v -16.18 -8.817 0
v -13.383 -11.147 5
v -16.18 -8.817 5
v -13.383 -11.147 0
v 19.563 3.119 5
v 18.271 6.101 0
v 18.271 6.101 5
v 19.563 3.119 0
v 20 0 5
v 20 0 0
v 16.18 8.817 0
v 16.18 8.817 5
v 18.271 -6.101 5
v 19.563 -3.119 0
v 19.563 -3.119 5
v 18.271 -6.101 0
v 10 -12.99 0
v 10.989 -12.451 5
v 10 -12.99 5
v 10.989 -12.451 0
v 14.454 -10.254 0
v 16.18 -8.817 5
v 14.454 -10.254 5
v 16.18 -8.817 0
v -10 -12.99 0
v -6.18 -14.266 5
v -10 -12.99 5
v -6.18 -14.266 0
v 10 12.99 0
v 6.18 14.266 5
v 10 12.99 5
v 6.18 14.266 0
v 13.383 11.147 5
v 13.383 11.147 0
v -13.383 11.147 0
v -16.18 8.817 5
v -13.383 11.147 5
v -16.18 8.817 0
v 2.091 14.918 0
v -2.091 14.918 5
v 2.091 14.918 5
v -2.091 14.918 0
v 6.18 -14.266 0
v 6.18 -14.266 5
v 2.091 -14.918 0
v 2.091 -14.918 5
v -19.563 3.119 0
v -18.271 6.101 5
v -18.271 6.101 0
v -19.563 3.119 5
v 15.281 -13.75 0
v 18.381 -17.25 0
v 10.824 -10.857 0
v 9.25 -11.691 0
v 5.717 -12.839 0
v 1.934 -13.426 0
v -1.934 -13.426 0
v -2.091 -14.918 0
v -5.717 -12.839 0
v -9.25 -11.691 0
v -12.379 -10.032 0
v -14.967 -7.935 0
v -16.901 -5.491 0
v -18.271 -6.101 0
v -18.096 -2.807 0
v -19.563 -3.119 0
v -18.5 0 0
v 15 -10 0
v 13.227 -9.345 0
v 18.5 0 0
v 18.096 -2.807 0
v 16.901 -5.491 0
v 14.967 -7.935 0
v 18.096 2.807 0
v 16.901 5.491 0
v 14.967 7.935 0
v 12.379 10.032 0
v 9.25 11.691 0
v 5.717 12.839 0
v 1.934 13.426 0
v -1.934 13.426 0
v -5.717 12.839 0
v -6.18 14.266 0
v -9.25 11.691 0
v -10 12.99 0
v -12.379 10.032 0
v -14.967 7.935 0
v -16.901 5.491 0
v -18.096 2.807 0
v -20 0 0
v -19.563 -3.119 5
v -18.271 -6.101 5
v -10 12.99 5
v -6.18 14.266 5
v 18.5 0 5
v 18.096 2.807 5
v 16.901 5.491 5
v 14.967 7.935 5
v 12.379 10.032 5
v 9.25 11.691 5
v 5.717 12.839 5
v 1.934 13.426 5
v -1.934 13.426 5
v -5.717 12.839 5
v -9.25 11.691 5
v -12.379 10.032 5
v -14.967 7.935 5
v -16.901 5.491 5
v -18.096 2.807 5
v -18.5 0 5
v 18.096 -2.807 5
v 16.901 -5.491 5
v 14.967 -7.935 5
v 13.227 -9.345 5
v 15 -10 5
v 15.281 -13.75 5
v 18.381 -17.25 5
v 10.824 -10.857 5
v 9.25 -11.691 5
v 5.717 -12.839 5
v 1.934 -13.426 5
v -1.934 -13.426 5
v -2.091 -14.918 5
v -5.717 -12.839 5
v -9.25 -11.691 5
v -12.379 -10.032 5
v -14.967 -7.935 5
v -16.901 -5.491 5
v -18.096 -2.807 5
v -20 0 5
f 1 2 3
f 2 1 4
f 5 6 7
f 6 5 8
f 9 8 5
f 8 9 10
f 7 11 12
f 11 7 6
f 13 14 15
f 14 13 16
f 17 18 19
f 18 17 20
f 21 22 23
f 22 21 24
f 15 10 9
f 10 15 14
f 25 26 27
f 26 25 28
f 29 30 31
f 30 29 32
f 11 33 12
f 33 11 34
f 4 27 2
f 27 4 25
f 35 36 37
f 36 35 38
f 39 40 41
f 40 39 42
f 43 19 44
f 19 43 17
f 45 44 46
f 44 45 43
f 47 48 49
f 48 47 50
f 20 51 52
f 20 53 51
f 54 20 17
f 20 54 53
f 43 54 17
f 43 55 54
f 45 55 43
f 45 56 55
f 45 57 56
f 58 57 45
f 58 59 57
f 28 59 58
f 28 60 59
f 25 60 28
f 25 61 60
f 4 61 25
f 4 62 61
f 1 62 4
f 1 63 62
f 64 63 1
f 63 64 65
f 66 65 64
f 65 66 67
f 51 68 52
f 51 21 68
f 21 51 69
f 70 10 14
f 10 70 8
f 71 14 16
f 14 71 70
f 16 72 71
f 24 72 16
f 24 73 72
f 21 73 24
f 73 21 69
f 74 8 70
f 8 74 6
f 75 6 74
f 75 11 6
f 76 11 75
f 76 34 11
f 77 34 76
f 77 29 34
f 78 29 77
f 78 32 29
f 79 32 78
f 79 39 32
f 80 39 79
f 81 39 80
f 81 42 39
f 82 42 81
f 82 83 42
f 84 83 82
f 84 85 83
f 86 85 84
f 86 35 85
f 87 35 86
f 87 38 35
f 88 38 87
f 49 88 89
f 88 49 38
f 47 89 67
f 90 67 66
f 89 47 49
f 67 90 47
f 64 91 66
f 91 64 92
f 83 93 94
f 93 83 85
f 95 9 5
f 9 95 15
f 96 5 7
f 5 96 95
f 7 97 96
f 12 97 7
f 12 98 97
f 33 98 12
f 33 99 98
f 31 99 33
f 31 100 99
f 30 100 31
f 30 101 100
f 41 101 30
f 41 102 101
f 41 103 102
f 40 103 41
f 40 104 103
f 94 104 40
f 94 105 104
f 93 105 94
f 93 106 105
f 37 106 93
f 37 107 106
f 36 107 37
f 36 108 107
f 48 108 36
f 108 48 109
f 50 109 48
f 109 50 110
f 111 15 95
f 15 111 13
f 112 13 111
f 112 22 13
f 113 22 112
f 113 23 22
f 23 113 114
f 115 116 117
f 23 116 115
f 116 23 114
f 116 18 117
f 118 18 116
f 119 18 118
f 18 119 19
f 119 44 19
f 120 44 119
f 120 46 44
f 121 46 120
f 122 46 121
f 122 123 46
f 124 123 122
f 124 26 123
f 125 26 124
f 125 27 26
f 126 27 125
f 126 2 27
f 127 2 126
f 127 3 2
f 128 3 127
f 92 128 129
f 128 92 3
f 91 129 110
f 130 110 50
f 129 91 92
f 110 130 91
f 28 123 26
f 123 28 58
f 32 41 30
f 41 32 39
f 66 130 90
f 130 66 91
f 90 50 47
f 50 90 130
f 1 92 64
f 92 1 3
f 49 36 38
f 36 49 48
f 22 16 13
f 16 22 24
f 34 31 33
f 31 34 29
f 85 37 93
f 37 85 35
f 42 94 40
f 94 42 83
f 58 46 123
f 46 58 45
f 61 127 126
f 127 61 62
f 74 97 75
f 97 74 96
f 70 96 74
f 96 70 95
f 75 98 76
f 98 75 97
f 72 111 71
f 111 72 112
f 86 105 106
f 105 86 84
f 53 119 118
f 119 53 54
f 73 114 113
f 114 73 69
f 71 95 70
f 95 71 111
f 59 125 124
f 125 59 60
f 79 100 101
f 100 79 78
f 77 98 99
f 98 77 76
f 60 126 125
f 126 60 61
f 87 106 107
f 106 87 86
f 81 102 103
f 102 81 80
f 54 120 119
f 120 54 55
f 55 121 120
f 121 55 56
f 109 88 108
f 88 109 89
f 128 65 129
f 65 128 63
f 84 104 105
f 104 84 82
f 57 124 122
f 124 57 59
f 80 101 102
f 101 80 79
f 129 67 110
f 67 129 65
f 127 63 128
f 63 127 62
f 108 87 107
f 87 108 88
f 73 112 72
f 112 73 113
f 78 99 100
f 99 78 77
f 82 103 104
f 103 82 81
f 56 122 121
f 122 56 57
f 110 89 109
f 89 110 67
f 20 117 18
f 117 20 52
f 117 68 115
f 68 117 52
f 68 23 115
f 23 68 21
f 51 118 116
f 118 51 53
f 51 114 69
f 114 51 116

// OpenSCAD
// file: ../../open-oval/open-oval.scad
use <MCAD/shapes.scad>
//use </usr/share/openscad/libraries/MCAD/shapes.scad>
//use </Applications/OpenSCAD.app/Contents/Resources/libraries/MCAD/shapes.scad>

module openOval(borderThickness = 3, yLength = 10)
{
	openOval2d(borderThickness = borderThickness,
			   height = yLength);
}

/** Support functions and modules follow.  **/

module openOval2d(borderThickness = 3,
				  depth = 5,
				  height = 10,
				  width = 20)
{
	difference()
	{
		ellipticalCylinder(w = width, h = height, height = depth);

		w = width - borderThickness;
		h = height - borderThickness;
		translate([0, 0, -0.02])
		ellipticalCylinder(w = w, h = h, height = depth + 0.1);
	}
}
// file: ../dialog-bubble.scad
use <MCAD/triangles.scad>
//use <MCAD/shapes.scad>

use <../open-oval/open-oval.scad>

module dialogBubble(pointerRotateZ = 25,
					yLength = 10)
{
	difference()
	{
		dialogBubble_block(pointerRotateZ, yLength);

		dialogBubble_cutouts(pointerRotateZ, yLength);
	}

//	dialogBubble_cutouts(pointerRotateZ, yLength);
}

/** Support functions and modules follow.  **/

module dialogBubble_block(pointerRotateZ, yLength)
{
	union()
	{
//		% // transparent
		openOval(borderThickness = 1.5,
				 yLength = yLength);

		dialogBubble_pointer(pointerRotateZ, yLength);
	}
}

module dialogBubble_cutouts(pointerRotateZ, yLength)
{

	translate([-3.1, 3.5, -0.02])
	scale([1,1,1.02])
	dialogBubble_pointer(pointerRotateZ, yLength);
}

module dialogBubble_pointer(pointerRotateZ, yLength)
{
	yTranslate = -5;
	yTranslate = -yLength + 5;
	rotateZ = pointerRotateZ;
	translate([15, yTranslate, 0])
	rotate([0, 0, rotateZ])
	triangle(o_len = -8, a_len = -5, depth=5);
}
// main file
//use <MCAD/shapes.scad>

use <../dialog-bubble.scad>

dialogBubble(yLength = 15);
